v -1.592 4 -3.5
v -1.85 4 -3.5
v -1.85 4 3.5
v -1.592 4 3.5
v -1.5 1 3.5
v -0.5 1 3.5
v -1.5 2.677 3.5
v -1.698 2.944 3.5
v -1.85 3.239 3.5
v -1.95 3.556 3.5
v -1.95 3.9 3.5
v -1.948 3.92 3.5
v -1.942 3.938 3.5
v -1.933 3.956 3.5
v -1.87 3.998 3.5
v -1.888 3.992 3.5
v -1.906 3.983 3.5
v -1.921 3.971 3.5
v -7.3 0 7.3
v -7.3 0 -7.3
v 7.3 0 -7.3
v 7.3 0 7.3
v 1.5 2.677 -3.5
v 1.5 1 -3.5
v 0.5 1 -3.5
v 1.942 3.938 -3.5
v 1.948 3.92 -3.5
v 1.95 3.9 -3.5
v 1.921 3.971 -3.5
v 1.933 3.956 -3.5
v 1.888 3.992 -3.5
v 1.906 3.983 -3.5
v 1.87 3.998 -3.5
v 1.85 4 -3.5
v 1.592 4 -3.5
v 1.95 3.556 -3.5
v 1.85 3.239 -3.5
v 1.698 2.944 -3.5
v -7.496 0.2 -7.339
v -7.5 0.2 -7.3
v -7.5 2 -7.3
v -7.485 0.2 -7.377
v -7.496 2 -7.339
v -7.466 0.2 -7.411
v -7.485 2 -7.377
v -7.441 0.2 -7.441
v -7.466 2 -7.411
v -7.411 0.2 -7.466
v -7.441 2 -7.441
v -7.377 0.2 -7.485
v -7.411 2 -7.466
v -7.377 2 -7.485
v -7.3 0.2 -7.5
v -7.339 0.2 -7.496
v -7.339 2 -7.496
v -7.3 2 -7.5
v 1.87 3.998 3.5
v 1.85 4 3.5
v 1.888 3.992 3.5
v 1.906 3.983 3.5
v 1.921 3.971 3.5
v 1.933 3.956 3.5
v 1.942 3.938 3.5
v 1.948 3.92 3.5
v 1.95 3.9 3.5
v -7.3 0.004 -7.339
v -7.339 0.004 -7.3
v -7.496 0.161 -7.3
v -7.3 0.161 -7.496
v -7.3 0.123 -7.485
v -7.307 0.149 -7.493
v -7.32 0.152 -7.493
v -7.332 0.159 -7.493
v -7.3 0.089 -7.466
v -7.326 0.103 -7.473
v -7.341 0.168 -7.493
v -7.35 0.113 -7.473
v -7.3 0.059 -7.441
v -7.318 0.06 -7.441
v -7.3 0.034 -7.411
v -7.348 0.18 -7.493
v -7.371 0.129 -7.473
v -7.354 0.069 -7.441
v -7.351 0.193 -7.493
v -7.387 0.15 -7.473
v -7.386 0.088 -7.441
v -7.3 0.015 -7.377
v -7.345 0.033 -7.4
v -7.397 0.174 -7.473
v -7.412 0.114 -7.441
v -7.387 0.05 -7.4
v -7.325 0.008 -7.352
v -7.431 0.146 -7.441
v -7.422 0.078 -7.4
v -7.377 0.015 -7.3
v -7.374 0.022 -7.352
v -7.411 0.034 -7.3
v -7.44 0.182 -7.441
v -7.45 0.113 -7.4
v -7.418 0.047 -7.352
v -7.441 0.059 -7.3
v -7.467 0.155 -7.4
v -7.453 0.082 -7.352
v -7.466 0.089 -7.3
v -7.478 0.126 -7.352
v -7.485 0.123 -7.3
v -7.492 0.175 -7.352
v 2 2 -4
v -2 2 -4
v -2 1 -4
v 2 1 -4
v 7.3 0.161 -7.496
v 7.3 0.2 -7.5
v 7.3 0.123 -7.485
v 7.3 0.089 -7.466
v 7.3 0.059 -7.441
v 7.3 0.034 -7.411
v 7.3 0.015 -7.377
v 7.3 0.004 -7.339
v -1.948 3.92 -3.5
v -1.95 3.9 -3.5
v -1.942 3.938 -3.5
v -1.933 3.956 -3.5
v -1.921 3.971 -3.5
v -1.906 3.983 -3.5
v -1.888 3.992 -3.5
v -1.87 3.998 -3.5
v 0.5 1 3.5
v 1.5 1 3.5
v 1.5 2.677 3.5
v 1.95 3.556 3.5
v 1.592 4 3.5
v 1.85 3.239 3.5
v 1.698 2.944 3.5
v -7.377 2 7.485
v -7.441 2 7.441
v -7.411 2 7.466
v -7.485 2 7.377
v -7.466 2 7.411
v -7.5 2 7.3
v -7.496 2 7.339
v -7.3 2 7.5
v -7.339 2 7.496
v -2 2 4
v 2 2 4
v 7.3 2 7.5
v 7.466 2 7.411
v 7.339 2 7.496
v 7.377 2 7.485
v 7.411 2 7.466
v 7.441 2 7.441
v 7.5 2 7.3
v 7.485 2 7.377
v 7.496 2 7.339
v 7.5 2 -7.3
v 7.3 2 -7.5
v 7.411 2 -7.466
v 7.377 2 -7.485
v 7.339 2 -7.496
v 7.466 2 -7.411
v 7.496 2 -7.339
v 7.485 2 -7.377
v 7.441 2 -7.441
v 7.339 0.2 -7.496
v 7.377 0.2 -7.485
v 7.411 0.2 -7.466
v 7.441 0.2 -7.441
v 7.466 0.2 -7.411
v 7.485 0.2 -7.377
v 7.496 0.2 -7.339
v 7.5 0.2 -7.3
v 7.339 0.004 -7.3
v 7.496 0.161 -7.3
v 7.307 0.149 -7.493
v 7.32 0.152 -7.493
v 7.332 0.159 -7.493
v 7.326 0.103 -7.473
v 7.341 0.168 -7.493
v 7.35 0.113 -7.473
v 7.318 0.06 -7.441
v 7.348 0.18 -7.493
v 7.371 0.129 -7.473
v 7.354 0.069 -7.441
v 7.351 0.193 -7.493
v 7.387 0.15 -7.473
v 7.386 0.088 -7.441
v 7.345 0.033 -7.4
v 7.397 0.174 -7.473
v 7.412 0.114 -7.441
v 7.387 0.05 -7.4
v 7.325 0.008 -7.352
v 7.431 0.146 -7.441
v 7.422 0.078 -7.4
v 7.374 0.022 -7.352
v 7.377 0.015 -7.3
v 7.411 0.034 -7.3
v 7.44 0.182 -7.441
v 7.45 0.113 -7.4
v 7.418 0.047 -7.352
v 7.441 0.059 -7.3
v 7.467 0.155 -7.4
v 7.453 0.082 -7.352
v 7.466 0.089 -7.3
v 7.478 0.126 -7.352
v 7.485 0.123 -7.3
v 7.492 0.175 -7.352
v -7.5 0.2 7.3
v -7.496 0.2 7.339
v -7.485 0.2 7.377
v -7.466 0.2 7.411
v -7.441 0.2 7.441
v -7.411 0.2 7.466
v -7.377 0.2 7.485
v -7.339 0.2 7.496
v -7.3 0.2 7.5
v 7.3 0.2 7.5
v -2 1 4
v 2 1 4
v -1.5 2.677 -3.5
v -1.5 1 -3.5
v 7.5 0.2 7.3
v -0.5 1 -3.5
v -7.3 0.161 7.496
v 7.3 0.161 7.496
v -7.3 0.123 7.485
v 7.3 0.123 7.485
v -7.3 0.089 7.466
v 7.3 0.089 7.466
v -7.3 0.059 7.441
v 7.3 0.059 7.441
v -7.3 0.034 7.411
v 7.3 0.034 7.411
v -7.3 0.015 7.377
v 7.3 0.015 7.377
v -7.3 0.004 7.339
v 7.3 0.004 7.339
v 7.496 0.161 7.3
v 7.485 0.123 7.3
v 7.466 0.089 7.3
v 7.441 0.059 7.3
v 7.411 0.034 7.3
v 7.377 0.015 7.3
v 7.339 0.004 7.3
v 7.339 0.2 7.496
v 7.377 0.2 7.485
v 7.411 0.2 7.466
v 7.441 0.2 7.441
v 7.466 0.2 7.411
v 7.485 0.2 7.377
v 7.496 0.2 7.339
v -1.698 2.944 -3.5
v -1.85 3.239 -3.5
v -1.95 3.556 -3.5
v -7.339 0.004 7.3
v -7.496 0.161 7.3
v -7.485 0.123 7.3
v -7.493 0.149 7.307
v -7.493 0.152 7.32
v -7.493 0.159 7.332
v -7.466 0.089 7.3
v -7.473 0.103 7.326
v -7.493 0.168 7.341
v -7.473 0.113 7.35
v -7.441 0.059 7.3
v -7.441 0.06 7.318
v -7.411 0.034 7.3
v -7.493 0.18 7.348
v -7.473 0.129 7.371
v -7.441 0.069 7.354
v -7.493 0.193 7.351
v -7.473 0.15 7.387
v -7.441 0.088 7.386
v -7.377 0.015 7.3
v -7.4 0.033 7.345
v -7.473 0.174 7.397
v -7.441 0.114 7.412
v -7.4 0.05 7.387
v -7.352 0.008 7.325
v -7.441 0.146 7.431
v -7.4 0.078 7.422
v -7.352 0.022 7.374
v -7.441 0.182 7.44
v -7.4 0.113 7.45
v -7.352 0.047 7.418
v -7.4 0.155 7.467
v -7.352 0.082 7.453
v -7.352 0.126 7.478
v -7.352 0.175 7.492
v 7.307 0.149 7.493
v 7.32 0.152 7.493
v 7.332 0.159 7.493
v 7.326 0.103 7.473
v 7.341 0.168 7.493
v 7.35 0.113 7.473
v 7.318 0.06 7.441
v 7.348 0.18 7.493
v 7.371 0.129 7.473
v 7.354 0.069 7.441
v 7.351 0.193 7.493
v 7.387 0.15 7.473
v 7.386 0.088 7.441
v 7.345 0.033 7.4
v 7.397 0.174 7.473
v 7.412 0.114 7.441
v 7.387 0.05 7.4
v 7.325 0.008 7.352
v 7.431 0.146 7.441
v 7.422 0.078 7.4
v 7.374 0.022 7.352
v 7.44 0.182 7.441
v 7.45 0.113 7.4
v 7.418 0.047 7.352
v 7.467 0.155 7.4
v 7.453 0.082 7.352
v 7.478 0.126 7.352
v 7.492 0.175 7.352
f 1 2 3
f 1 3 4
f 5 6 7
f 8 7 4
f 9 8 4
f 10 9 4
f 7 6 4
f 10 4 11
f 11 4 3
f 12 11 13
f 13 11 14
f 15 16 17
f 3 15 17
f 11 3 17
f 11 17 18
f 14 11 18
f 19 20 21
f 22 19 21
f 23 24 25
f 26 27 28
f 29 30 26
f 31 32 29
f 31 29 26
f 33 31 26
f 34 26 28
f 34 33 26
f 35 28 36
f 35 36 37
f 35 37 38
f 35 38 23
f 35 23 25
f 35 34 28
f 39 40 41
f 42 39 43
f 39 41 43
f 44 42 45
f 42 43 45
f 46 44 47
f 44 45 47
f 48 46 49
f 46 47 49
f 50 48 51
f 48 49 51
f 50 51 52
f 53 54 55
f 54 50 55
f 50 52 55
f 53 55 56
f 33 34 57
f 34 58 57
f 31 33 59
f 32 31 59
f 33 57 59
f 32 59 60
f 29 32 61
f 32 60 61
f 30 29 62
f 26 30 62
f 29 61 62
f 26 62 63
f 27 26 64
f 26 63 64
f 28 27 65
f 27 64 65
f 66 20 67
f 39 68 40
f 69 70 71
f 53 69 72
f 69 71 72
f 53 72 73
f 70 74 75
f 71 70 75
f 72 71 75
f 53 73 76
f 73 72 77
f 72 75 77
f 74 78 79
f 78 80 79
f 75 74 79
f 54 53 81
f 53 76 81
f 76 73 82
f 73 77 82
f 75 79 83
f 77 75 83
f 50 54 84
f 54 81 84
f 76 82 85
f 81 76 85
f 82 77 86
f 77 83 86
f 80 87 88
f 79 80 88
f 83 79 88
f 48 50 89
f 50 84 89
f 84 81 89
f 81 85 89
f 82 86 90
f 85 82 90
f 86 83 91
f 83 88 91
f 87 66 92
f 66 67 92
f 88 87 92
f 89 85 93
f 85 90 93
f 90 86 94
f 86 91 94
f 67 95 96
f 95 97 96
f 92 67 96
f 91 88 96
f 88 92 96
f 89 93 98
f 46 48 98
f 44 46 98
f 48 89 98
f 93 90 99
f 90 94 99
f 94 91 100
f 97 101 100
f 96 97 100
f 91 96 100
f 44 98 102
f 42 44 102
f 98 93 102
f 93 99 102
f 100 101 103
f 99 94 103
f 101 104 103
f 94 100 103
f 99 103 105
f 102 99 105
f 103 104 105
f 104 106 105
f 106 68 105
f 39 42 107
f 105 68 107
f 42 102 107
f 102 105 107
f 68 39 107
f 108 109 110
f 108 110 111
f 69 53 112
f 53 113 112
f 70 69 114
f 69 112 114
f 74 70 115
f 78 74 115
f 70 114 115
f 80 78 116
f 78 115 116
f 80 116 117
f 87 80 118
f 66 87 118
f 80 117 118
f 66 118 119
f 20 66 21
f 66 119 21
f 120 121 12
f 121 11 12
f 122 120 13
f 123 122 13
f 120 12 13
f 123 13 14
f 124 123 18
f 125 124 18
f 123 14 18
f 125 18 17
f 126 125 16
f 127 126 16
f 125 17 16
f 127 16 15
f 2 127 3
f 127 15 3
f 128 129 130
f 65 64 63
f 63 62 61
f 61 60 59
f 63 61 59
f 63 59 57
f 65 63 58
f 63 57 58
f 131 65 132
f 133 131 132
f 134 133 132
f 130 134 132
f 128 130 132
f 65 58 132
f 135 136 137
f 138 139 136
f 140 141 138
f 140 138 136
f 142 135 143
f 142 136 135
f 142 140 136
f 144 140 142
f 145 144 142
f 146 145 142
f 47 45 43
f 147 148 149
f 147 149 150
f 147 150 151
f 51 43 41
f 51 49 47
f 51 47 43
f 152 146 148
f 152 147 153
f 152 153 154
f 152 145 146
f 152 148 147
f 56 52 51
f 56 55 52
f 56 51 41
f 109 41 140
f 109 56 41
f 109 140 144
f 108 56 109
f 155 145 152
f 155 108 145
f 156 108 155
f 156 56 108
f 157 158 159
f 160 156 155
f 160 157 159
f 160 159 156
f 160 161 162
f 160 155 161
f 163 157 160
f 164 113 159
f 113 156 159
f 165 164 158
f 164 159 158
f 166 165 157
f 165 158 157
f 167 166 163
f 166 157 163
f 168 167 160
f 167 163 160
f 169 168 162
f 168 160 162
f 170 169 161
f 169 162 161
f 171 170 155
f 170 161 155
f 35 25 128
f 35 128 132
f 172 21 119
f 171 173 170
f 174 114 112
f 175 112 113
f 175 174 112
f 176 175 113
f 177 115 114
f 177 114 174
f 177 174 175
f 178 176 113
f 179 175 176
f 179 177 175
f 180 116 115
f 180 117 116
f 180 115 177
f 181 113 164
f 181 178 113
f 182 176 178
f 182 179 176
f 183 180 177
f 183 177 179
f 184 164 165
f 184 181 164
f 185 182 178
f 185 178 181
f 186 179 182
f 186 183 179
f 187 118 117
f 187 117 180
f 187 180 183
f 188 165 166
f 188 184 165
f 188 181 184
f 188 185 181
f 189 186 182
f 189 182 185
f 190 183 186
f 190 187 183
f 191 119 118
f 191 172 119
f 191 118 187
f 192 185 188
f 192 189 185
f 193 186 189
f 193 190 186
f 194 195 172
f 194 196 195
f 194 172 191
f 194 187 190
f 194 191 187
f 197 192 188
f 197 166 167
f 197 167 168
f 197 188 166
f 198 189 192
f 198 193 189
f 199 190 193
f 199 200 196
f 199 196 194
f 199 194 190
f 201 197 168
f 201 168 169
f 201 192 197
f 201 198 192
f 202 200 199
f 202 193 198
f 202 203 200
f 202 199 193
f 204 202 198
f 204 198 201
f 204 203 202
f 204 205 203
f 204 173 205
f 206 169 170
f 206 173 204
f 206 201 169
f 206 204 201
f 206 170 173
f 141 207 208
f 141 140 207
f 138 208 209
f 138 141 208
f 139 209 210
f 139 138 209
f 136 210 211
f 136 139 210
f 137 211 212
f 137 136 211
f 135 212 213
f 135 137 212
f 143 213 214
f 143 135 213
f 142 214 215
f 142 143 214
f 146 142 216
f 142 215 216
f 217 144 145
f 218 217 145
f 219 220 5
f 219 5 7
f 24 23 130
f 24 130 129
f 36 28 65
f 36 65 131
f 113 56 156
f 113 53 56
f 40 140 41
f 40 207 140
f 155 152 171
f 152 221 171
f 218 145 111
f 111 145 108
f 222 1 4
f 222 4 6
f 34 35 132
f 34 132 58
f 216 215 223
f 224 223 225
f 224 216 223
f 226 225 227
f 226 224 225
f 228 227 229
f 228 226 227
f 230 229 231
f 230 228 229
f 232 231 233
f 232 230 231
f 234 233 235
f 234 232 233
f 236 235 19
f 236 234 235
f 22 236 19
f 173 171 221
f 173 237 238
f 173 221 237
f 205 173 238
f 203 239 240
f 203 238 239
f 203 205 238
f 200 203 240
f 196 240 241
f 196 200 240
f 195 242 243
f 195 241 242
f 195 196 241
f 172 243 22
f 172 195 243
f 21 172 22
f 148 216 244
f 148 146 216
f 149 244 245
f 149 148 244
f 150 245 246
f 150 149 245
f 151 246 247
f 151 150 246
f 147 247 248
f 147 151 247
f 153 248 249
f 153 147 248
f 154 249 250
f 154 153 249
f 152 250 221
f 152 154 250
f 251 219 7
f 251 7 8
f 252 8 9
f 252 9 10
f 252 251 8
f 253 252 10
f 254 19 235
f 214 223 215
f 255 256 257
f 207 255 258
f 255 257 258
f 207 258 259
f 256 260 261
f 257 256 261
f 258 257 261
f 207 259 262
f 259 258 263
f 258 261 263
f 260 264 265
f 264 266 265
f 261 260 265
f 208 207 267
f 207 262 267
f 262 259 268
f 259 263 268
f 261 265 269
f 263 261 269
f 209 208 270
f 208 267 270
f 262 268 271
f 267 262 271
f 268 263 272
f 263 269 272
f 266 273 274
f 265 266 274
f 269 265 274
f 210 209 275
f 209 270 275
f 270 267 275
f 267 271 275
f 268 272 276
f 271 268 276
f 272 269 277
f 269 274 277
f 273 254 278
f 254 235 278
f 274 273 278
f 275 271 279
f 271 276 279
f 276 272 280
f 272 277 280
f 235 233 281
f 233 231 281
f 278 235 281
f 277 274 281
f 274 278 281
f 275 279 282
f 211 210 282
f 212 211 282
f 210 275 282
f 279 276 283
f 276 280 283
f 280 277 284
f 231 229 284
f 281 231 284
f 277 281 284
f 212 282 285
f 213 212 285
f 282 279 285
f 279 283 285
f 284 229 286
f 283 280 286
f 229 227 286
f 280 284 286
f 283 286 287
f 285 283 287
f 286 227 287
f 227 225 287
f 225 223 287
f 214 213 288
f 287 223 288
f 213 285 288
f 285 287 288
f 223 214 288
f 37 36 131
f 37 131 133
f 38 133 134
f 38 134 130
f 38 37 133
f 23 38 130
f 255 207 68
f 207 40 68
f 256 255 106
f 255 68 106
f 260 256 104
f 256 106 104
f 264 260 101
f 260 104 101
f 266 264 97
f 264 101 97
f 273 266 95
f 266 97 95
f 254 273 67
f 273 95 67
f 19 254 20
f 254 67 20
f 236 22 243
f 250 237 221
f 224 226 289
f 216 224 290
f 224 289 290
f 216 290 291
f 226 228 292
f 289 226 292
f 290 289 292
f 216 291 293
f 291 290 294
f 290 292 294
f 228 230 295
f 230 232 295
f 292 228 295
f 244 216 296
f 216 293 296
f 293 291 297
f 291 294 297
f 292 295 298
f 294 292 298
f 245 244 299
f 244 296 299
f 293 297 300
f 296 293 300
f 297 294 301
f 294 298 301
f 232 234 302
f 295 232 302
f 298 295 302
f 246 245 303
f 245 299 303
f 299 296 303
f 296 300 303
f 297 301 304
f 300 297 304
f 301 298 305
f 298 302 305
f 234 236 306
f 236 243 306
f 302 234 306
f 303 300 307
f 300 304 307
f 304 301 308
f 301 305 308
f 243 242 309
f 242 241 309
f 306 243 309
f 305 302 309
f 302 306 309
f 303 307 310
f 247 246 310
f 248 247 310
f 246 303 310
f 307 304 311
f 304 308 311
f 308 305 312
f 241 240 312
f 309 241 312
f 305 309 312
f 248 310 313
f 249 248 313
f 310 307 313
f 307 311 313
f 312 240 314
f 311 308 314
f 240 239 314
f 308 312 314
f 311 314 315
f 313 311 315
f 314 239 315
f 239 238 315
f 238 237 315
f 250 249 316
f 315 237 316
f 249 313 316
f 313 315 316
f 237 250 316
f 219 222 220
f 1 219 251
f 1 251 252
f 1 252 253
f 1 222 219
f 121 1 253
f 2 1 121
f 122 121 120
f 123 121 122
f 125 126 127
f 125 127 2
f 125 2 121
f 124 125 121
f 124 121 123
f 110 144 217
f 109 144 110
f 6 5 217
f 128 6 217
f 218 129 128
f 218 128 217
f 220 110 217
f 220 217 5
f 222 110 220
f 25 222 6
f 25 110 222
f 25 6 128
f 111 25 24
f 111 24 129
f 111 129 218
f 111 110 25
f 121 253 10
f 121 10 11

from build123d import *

# Parameters (mm, degrees)
SKETCH_1_W           = 15
SKETCH_1_H           = 15
EXTRUDE_1_DEPTH      = 2
SKETCH_2_W           = 4
SKETCH_2_H           = 8
CUT_EXTRUDE_1_DEPTH  = 1
EXTRUDE_2_DEPTH      = 3.5
EXTRUDE_2_DEPTH_BACK = 3.5
FILLET_1_R           = 0.1
FILLET_2_R           = 0.2


with BuildPart() as part:
    # 草图1 → 凸台-拉伸1 (new body)
    with BuildSketch(Plane(origin=(0, 0, 0), x_dir=(1, 0, 0), z_dir=(0, 1, 0))):
        Rectangle(SKETCH_1_W, SKETCH_1_H)
    extrude(amount=EXTRUDE_1_DEPTH)

    # 草图2 → 切除-拉伸1 (cut)
    with BuildSketch(Plane(origin=(0, 2, 0), x_dir=(1, 0, 0), z_dir=(0, 1, 0))):
        Rectangle(SKETCH_2_W, SKETCH_2_H)
    extrude(amount=-CUT_EXTRUDE_1_DEPTH, mode=Mode.SUBTRACT)

    # 草图3 → 凸台-拉伸2 (add, two sides: drawn at the far end of the back side and taken through both)
    with BuildSketch(Plane.XY.offset(-EXTRUDE_2_DEPTH_BACK)):
        with BuildLine():
            Line((-0.5, 1), (-1.5, 1))
            Line((-1.5, 1), (-1.5, 2.677124344))
            ThreePointArc((-1.5, 2.677124344), (-1.780042303, 3.088161527), (-1.95, 3.555590279))
            Line((-1.95, 3.555590279), (-1.95, 4))
            Line((-1.95, 4), (-1.591910703, 4))
            Line((-1.591910703, 4), (-0.5, 1))
        make_face()
        with BuildLine():
            Line((1.591910703, 4), (1.95, 4))
            Line((1.95, 4), (1.95, 3.555590279))
            ThreePointArc((1.95, 3.555590279), (1.780042303, 3.088161527), (1.5, 2.677124344))
            Line((1.5, 2.677124344), (1.5, 1))
            Line((1.5, 1), (0.5, 1))
            Line((0.5, 1), (1.591910703, 4))
        make_face()
    extrude(amount=EXTRUDE_2_DEPTH + EXTRUDE_2_DEPTH_BACK)

    # 圆角1
    fillet_1_edges = [part.edges().sort_by_distance(p)[0] for p in [
        (-1.95, 4, 0),
        (1.95, 4, 0),
    ]]
    fillet(fillet_1_edges, radius=FILLET_1_R)

    # 圆角2
    fillet_2_edges = [part.edges().sort_by_distance(p)[0] for p in [
        (7.5, 0, 0),
        (0, 0, 7.5),
        (-7.5, 0, 0),
        (0, 0, -7.5),
        (7.5, 1, -7.5),
        (7.5, 1, 7.5),
        (-7.5, 1, 7.5),
        (-7.5, 1, -7.5),
    ]]
    fillet(fillet_2_edges, radius=FILLET_2_R)


solid = part.part
